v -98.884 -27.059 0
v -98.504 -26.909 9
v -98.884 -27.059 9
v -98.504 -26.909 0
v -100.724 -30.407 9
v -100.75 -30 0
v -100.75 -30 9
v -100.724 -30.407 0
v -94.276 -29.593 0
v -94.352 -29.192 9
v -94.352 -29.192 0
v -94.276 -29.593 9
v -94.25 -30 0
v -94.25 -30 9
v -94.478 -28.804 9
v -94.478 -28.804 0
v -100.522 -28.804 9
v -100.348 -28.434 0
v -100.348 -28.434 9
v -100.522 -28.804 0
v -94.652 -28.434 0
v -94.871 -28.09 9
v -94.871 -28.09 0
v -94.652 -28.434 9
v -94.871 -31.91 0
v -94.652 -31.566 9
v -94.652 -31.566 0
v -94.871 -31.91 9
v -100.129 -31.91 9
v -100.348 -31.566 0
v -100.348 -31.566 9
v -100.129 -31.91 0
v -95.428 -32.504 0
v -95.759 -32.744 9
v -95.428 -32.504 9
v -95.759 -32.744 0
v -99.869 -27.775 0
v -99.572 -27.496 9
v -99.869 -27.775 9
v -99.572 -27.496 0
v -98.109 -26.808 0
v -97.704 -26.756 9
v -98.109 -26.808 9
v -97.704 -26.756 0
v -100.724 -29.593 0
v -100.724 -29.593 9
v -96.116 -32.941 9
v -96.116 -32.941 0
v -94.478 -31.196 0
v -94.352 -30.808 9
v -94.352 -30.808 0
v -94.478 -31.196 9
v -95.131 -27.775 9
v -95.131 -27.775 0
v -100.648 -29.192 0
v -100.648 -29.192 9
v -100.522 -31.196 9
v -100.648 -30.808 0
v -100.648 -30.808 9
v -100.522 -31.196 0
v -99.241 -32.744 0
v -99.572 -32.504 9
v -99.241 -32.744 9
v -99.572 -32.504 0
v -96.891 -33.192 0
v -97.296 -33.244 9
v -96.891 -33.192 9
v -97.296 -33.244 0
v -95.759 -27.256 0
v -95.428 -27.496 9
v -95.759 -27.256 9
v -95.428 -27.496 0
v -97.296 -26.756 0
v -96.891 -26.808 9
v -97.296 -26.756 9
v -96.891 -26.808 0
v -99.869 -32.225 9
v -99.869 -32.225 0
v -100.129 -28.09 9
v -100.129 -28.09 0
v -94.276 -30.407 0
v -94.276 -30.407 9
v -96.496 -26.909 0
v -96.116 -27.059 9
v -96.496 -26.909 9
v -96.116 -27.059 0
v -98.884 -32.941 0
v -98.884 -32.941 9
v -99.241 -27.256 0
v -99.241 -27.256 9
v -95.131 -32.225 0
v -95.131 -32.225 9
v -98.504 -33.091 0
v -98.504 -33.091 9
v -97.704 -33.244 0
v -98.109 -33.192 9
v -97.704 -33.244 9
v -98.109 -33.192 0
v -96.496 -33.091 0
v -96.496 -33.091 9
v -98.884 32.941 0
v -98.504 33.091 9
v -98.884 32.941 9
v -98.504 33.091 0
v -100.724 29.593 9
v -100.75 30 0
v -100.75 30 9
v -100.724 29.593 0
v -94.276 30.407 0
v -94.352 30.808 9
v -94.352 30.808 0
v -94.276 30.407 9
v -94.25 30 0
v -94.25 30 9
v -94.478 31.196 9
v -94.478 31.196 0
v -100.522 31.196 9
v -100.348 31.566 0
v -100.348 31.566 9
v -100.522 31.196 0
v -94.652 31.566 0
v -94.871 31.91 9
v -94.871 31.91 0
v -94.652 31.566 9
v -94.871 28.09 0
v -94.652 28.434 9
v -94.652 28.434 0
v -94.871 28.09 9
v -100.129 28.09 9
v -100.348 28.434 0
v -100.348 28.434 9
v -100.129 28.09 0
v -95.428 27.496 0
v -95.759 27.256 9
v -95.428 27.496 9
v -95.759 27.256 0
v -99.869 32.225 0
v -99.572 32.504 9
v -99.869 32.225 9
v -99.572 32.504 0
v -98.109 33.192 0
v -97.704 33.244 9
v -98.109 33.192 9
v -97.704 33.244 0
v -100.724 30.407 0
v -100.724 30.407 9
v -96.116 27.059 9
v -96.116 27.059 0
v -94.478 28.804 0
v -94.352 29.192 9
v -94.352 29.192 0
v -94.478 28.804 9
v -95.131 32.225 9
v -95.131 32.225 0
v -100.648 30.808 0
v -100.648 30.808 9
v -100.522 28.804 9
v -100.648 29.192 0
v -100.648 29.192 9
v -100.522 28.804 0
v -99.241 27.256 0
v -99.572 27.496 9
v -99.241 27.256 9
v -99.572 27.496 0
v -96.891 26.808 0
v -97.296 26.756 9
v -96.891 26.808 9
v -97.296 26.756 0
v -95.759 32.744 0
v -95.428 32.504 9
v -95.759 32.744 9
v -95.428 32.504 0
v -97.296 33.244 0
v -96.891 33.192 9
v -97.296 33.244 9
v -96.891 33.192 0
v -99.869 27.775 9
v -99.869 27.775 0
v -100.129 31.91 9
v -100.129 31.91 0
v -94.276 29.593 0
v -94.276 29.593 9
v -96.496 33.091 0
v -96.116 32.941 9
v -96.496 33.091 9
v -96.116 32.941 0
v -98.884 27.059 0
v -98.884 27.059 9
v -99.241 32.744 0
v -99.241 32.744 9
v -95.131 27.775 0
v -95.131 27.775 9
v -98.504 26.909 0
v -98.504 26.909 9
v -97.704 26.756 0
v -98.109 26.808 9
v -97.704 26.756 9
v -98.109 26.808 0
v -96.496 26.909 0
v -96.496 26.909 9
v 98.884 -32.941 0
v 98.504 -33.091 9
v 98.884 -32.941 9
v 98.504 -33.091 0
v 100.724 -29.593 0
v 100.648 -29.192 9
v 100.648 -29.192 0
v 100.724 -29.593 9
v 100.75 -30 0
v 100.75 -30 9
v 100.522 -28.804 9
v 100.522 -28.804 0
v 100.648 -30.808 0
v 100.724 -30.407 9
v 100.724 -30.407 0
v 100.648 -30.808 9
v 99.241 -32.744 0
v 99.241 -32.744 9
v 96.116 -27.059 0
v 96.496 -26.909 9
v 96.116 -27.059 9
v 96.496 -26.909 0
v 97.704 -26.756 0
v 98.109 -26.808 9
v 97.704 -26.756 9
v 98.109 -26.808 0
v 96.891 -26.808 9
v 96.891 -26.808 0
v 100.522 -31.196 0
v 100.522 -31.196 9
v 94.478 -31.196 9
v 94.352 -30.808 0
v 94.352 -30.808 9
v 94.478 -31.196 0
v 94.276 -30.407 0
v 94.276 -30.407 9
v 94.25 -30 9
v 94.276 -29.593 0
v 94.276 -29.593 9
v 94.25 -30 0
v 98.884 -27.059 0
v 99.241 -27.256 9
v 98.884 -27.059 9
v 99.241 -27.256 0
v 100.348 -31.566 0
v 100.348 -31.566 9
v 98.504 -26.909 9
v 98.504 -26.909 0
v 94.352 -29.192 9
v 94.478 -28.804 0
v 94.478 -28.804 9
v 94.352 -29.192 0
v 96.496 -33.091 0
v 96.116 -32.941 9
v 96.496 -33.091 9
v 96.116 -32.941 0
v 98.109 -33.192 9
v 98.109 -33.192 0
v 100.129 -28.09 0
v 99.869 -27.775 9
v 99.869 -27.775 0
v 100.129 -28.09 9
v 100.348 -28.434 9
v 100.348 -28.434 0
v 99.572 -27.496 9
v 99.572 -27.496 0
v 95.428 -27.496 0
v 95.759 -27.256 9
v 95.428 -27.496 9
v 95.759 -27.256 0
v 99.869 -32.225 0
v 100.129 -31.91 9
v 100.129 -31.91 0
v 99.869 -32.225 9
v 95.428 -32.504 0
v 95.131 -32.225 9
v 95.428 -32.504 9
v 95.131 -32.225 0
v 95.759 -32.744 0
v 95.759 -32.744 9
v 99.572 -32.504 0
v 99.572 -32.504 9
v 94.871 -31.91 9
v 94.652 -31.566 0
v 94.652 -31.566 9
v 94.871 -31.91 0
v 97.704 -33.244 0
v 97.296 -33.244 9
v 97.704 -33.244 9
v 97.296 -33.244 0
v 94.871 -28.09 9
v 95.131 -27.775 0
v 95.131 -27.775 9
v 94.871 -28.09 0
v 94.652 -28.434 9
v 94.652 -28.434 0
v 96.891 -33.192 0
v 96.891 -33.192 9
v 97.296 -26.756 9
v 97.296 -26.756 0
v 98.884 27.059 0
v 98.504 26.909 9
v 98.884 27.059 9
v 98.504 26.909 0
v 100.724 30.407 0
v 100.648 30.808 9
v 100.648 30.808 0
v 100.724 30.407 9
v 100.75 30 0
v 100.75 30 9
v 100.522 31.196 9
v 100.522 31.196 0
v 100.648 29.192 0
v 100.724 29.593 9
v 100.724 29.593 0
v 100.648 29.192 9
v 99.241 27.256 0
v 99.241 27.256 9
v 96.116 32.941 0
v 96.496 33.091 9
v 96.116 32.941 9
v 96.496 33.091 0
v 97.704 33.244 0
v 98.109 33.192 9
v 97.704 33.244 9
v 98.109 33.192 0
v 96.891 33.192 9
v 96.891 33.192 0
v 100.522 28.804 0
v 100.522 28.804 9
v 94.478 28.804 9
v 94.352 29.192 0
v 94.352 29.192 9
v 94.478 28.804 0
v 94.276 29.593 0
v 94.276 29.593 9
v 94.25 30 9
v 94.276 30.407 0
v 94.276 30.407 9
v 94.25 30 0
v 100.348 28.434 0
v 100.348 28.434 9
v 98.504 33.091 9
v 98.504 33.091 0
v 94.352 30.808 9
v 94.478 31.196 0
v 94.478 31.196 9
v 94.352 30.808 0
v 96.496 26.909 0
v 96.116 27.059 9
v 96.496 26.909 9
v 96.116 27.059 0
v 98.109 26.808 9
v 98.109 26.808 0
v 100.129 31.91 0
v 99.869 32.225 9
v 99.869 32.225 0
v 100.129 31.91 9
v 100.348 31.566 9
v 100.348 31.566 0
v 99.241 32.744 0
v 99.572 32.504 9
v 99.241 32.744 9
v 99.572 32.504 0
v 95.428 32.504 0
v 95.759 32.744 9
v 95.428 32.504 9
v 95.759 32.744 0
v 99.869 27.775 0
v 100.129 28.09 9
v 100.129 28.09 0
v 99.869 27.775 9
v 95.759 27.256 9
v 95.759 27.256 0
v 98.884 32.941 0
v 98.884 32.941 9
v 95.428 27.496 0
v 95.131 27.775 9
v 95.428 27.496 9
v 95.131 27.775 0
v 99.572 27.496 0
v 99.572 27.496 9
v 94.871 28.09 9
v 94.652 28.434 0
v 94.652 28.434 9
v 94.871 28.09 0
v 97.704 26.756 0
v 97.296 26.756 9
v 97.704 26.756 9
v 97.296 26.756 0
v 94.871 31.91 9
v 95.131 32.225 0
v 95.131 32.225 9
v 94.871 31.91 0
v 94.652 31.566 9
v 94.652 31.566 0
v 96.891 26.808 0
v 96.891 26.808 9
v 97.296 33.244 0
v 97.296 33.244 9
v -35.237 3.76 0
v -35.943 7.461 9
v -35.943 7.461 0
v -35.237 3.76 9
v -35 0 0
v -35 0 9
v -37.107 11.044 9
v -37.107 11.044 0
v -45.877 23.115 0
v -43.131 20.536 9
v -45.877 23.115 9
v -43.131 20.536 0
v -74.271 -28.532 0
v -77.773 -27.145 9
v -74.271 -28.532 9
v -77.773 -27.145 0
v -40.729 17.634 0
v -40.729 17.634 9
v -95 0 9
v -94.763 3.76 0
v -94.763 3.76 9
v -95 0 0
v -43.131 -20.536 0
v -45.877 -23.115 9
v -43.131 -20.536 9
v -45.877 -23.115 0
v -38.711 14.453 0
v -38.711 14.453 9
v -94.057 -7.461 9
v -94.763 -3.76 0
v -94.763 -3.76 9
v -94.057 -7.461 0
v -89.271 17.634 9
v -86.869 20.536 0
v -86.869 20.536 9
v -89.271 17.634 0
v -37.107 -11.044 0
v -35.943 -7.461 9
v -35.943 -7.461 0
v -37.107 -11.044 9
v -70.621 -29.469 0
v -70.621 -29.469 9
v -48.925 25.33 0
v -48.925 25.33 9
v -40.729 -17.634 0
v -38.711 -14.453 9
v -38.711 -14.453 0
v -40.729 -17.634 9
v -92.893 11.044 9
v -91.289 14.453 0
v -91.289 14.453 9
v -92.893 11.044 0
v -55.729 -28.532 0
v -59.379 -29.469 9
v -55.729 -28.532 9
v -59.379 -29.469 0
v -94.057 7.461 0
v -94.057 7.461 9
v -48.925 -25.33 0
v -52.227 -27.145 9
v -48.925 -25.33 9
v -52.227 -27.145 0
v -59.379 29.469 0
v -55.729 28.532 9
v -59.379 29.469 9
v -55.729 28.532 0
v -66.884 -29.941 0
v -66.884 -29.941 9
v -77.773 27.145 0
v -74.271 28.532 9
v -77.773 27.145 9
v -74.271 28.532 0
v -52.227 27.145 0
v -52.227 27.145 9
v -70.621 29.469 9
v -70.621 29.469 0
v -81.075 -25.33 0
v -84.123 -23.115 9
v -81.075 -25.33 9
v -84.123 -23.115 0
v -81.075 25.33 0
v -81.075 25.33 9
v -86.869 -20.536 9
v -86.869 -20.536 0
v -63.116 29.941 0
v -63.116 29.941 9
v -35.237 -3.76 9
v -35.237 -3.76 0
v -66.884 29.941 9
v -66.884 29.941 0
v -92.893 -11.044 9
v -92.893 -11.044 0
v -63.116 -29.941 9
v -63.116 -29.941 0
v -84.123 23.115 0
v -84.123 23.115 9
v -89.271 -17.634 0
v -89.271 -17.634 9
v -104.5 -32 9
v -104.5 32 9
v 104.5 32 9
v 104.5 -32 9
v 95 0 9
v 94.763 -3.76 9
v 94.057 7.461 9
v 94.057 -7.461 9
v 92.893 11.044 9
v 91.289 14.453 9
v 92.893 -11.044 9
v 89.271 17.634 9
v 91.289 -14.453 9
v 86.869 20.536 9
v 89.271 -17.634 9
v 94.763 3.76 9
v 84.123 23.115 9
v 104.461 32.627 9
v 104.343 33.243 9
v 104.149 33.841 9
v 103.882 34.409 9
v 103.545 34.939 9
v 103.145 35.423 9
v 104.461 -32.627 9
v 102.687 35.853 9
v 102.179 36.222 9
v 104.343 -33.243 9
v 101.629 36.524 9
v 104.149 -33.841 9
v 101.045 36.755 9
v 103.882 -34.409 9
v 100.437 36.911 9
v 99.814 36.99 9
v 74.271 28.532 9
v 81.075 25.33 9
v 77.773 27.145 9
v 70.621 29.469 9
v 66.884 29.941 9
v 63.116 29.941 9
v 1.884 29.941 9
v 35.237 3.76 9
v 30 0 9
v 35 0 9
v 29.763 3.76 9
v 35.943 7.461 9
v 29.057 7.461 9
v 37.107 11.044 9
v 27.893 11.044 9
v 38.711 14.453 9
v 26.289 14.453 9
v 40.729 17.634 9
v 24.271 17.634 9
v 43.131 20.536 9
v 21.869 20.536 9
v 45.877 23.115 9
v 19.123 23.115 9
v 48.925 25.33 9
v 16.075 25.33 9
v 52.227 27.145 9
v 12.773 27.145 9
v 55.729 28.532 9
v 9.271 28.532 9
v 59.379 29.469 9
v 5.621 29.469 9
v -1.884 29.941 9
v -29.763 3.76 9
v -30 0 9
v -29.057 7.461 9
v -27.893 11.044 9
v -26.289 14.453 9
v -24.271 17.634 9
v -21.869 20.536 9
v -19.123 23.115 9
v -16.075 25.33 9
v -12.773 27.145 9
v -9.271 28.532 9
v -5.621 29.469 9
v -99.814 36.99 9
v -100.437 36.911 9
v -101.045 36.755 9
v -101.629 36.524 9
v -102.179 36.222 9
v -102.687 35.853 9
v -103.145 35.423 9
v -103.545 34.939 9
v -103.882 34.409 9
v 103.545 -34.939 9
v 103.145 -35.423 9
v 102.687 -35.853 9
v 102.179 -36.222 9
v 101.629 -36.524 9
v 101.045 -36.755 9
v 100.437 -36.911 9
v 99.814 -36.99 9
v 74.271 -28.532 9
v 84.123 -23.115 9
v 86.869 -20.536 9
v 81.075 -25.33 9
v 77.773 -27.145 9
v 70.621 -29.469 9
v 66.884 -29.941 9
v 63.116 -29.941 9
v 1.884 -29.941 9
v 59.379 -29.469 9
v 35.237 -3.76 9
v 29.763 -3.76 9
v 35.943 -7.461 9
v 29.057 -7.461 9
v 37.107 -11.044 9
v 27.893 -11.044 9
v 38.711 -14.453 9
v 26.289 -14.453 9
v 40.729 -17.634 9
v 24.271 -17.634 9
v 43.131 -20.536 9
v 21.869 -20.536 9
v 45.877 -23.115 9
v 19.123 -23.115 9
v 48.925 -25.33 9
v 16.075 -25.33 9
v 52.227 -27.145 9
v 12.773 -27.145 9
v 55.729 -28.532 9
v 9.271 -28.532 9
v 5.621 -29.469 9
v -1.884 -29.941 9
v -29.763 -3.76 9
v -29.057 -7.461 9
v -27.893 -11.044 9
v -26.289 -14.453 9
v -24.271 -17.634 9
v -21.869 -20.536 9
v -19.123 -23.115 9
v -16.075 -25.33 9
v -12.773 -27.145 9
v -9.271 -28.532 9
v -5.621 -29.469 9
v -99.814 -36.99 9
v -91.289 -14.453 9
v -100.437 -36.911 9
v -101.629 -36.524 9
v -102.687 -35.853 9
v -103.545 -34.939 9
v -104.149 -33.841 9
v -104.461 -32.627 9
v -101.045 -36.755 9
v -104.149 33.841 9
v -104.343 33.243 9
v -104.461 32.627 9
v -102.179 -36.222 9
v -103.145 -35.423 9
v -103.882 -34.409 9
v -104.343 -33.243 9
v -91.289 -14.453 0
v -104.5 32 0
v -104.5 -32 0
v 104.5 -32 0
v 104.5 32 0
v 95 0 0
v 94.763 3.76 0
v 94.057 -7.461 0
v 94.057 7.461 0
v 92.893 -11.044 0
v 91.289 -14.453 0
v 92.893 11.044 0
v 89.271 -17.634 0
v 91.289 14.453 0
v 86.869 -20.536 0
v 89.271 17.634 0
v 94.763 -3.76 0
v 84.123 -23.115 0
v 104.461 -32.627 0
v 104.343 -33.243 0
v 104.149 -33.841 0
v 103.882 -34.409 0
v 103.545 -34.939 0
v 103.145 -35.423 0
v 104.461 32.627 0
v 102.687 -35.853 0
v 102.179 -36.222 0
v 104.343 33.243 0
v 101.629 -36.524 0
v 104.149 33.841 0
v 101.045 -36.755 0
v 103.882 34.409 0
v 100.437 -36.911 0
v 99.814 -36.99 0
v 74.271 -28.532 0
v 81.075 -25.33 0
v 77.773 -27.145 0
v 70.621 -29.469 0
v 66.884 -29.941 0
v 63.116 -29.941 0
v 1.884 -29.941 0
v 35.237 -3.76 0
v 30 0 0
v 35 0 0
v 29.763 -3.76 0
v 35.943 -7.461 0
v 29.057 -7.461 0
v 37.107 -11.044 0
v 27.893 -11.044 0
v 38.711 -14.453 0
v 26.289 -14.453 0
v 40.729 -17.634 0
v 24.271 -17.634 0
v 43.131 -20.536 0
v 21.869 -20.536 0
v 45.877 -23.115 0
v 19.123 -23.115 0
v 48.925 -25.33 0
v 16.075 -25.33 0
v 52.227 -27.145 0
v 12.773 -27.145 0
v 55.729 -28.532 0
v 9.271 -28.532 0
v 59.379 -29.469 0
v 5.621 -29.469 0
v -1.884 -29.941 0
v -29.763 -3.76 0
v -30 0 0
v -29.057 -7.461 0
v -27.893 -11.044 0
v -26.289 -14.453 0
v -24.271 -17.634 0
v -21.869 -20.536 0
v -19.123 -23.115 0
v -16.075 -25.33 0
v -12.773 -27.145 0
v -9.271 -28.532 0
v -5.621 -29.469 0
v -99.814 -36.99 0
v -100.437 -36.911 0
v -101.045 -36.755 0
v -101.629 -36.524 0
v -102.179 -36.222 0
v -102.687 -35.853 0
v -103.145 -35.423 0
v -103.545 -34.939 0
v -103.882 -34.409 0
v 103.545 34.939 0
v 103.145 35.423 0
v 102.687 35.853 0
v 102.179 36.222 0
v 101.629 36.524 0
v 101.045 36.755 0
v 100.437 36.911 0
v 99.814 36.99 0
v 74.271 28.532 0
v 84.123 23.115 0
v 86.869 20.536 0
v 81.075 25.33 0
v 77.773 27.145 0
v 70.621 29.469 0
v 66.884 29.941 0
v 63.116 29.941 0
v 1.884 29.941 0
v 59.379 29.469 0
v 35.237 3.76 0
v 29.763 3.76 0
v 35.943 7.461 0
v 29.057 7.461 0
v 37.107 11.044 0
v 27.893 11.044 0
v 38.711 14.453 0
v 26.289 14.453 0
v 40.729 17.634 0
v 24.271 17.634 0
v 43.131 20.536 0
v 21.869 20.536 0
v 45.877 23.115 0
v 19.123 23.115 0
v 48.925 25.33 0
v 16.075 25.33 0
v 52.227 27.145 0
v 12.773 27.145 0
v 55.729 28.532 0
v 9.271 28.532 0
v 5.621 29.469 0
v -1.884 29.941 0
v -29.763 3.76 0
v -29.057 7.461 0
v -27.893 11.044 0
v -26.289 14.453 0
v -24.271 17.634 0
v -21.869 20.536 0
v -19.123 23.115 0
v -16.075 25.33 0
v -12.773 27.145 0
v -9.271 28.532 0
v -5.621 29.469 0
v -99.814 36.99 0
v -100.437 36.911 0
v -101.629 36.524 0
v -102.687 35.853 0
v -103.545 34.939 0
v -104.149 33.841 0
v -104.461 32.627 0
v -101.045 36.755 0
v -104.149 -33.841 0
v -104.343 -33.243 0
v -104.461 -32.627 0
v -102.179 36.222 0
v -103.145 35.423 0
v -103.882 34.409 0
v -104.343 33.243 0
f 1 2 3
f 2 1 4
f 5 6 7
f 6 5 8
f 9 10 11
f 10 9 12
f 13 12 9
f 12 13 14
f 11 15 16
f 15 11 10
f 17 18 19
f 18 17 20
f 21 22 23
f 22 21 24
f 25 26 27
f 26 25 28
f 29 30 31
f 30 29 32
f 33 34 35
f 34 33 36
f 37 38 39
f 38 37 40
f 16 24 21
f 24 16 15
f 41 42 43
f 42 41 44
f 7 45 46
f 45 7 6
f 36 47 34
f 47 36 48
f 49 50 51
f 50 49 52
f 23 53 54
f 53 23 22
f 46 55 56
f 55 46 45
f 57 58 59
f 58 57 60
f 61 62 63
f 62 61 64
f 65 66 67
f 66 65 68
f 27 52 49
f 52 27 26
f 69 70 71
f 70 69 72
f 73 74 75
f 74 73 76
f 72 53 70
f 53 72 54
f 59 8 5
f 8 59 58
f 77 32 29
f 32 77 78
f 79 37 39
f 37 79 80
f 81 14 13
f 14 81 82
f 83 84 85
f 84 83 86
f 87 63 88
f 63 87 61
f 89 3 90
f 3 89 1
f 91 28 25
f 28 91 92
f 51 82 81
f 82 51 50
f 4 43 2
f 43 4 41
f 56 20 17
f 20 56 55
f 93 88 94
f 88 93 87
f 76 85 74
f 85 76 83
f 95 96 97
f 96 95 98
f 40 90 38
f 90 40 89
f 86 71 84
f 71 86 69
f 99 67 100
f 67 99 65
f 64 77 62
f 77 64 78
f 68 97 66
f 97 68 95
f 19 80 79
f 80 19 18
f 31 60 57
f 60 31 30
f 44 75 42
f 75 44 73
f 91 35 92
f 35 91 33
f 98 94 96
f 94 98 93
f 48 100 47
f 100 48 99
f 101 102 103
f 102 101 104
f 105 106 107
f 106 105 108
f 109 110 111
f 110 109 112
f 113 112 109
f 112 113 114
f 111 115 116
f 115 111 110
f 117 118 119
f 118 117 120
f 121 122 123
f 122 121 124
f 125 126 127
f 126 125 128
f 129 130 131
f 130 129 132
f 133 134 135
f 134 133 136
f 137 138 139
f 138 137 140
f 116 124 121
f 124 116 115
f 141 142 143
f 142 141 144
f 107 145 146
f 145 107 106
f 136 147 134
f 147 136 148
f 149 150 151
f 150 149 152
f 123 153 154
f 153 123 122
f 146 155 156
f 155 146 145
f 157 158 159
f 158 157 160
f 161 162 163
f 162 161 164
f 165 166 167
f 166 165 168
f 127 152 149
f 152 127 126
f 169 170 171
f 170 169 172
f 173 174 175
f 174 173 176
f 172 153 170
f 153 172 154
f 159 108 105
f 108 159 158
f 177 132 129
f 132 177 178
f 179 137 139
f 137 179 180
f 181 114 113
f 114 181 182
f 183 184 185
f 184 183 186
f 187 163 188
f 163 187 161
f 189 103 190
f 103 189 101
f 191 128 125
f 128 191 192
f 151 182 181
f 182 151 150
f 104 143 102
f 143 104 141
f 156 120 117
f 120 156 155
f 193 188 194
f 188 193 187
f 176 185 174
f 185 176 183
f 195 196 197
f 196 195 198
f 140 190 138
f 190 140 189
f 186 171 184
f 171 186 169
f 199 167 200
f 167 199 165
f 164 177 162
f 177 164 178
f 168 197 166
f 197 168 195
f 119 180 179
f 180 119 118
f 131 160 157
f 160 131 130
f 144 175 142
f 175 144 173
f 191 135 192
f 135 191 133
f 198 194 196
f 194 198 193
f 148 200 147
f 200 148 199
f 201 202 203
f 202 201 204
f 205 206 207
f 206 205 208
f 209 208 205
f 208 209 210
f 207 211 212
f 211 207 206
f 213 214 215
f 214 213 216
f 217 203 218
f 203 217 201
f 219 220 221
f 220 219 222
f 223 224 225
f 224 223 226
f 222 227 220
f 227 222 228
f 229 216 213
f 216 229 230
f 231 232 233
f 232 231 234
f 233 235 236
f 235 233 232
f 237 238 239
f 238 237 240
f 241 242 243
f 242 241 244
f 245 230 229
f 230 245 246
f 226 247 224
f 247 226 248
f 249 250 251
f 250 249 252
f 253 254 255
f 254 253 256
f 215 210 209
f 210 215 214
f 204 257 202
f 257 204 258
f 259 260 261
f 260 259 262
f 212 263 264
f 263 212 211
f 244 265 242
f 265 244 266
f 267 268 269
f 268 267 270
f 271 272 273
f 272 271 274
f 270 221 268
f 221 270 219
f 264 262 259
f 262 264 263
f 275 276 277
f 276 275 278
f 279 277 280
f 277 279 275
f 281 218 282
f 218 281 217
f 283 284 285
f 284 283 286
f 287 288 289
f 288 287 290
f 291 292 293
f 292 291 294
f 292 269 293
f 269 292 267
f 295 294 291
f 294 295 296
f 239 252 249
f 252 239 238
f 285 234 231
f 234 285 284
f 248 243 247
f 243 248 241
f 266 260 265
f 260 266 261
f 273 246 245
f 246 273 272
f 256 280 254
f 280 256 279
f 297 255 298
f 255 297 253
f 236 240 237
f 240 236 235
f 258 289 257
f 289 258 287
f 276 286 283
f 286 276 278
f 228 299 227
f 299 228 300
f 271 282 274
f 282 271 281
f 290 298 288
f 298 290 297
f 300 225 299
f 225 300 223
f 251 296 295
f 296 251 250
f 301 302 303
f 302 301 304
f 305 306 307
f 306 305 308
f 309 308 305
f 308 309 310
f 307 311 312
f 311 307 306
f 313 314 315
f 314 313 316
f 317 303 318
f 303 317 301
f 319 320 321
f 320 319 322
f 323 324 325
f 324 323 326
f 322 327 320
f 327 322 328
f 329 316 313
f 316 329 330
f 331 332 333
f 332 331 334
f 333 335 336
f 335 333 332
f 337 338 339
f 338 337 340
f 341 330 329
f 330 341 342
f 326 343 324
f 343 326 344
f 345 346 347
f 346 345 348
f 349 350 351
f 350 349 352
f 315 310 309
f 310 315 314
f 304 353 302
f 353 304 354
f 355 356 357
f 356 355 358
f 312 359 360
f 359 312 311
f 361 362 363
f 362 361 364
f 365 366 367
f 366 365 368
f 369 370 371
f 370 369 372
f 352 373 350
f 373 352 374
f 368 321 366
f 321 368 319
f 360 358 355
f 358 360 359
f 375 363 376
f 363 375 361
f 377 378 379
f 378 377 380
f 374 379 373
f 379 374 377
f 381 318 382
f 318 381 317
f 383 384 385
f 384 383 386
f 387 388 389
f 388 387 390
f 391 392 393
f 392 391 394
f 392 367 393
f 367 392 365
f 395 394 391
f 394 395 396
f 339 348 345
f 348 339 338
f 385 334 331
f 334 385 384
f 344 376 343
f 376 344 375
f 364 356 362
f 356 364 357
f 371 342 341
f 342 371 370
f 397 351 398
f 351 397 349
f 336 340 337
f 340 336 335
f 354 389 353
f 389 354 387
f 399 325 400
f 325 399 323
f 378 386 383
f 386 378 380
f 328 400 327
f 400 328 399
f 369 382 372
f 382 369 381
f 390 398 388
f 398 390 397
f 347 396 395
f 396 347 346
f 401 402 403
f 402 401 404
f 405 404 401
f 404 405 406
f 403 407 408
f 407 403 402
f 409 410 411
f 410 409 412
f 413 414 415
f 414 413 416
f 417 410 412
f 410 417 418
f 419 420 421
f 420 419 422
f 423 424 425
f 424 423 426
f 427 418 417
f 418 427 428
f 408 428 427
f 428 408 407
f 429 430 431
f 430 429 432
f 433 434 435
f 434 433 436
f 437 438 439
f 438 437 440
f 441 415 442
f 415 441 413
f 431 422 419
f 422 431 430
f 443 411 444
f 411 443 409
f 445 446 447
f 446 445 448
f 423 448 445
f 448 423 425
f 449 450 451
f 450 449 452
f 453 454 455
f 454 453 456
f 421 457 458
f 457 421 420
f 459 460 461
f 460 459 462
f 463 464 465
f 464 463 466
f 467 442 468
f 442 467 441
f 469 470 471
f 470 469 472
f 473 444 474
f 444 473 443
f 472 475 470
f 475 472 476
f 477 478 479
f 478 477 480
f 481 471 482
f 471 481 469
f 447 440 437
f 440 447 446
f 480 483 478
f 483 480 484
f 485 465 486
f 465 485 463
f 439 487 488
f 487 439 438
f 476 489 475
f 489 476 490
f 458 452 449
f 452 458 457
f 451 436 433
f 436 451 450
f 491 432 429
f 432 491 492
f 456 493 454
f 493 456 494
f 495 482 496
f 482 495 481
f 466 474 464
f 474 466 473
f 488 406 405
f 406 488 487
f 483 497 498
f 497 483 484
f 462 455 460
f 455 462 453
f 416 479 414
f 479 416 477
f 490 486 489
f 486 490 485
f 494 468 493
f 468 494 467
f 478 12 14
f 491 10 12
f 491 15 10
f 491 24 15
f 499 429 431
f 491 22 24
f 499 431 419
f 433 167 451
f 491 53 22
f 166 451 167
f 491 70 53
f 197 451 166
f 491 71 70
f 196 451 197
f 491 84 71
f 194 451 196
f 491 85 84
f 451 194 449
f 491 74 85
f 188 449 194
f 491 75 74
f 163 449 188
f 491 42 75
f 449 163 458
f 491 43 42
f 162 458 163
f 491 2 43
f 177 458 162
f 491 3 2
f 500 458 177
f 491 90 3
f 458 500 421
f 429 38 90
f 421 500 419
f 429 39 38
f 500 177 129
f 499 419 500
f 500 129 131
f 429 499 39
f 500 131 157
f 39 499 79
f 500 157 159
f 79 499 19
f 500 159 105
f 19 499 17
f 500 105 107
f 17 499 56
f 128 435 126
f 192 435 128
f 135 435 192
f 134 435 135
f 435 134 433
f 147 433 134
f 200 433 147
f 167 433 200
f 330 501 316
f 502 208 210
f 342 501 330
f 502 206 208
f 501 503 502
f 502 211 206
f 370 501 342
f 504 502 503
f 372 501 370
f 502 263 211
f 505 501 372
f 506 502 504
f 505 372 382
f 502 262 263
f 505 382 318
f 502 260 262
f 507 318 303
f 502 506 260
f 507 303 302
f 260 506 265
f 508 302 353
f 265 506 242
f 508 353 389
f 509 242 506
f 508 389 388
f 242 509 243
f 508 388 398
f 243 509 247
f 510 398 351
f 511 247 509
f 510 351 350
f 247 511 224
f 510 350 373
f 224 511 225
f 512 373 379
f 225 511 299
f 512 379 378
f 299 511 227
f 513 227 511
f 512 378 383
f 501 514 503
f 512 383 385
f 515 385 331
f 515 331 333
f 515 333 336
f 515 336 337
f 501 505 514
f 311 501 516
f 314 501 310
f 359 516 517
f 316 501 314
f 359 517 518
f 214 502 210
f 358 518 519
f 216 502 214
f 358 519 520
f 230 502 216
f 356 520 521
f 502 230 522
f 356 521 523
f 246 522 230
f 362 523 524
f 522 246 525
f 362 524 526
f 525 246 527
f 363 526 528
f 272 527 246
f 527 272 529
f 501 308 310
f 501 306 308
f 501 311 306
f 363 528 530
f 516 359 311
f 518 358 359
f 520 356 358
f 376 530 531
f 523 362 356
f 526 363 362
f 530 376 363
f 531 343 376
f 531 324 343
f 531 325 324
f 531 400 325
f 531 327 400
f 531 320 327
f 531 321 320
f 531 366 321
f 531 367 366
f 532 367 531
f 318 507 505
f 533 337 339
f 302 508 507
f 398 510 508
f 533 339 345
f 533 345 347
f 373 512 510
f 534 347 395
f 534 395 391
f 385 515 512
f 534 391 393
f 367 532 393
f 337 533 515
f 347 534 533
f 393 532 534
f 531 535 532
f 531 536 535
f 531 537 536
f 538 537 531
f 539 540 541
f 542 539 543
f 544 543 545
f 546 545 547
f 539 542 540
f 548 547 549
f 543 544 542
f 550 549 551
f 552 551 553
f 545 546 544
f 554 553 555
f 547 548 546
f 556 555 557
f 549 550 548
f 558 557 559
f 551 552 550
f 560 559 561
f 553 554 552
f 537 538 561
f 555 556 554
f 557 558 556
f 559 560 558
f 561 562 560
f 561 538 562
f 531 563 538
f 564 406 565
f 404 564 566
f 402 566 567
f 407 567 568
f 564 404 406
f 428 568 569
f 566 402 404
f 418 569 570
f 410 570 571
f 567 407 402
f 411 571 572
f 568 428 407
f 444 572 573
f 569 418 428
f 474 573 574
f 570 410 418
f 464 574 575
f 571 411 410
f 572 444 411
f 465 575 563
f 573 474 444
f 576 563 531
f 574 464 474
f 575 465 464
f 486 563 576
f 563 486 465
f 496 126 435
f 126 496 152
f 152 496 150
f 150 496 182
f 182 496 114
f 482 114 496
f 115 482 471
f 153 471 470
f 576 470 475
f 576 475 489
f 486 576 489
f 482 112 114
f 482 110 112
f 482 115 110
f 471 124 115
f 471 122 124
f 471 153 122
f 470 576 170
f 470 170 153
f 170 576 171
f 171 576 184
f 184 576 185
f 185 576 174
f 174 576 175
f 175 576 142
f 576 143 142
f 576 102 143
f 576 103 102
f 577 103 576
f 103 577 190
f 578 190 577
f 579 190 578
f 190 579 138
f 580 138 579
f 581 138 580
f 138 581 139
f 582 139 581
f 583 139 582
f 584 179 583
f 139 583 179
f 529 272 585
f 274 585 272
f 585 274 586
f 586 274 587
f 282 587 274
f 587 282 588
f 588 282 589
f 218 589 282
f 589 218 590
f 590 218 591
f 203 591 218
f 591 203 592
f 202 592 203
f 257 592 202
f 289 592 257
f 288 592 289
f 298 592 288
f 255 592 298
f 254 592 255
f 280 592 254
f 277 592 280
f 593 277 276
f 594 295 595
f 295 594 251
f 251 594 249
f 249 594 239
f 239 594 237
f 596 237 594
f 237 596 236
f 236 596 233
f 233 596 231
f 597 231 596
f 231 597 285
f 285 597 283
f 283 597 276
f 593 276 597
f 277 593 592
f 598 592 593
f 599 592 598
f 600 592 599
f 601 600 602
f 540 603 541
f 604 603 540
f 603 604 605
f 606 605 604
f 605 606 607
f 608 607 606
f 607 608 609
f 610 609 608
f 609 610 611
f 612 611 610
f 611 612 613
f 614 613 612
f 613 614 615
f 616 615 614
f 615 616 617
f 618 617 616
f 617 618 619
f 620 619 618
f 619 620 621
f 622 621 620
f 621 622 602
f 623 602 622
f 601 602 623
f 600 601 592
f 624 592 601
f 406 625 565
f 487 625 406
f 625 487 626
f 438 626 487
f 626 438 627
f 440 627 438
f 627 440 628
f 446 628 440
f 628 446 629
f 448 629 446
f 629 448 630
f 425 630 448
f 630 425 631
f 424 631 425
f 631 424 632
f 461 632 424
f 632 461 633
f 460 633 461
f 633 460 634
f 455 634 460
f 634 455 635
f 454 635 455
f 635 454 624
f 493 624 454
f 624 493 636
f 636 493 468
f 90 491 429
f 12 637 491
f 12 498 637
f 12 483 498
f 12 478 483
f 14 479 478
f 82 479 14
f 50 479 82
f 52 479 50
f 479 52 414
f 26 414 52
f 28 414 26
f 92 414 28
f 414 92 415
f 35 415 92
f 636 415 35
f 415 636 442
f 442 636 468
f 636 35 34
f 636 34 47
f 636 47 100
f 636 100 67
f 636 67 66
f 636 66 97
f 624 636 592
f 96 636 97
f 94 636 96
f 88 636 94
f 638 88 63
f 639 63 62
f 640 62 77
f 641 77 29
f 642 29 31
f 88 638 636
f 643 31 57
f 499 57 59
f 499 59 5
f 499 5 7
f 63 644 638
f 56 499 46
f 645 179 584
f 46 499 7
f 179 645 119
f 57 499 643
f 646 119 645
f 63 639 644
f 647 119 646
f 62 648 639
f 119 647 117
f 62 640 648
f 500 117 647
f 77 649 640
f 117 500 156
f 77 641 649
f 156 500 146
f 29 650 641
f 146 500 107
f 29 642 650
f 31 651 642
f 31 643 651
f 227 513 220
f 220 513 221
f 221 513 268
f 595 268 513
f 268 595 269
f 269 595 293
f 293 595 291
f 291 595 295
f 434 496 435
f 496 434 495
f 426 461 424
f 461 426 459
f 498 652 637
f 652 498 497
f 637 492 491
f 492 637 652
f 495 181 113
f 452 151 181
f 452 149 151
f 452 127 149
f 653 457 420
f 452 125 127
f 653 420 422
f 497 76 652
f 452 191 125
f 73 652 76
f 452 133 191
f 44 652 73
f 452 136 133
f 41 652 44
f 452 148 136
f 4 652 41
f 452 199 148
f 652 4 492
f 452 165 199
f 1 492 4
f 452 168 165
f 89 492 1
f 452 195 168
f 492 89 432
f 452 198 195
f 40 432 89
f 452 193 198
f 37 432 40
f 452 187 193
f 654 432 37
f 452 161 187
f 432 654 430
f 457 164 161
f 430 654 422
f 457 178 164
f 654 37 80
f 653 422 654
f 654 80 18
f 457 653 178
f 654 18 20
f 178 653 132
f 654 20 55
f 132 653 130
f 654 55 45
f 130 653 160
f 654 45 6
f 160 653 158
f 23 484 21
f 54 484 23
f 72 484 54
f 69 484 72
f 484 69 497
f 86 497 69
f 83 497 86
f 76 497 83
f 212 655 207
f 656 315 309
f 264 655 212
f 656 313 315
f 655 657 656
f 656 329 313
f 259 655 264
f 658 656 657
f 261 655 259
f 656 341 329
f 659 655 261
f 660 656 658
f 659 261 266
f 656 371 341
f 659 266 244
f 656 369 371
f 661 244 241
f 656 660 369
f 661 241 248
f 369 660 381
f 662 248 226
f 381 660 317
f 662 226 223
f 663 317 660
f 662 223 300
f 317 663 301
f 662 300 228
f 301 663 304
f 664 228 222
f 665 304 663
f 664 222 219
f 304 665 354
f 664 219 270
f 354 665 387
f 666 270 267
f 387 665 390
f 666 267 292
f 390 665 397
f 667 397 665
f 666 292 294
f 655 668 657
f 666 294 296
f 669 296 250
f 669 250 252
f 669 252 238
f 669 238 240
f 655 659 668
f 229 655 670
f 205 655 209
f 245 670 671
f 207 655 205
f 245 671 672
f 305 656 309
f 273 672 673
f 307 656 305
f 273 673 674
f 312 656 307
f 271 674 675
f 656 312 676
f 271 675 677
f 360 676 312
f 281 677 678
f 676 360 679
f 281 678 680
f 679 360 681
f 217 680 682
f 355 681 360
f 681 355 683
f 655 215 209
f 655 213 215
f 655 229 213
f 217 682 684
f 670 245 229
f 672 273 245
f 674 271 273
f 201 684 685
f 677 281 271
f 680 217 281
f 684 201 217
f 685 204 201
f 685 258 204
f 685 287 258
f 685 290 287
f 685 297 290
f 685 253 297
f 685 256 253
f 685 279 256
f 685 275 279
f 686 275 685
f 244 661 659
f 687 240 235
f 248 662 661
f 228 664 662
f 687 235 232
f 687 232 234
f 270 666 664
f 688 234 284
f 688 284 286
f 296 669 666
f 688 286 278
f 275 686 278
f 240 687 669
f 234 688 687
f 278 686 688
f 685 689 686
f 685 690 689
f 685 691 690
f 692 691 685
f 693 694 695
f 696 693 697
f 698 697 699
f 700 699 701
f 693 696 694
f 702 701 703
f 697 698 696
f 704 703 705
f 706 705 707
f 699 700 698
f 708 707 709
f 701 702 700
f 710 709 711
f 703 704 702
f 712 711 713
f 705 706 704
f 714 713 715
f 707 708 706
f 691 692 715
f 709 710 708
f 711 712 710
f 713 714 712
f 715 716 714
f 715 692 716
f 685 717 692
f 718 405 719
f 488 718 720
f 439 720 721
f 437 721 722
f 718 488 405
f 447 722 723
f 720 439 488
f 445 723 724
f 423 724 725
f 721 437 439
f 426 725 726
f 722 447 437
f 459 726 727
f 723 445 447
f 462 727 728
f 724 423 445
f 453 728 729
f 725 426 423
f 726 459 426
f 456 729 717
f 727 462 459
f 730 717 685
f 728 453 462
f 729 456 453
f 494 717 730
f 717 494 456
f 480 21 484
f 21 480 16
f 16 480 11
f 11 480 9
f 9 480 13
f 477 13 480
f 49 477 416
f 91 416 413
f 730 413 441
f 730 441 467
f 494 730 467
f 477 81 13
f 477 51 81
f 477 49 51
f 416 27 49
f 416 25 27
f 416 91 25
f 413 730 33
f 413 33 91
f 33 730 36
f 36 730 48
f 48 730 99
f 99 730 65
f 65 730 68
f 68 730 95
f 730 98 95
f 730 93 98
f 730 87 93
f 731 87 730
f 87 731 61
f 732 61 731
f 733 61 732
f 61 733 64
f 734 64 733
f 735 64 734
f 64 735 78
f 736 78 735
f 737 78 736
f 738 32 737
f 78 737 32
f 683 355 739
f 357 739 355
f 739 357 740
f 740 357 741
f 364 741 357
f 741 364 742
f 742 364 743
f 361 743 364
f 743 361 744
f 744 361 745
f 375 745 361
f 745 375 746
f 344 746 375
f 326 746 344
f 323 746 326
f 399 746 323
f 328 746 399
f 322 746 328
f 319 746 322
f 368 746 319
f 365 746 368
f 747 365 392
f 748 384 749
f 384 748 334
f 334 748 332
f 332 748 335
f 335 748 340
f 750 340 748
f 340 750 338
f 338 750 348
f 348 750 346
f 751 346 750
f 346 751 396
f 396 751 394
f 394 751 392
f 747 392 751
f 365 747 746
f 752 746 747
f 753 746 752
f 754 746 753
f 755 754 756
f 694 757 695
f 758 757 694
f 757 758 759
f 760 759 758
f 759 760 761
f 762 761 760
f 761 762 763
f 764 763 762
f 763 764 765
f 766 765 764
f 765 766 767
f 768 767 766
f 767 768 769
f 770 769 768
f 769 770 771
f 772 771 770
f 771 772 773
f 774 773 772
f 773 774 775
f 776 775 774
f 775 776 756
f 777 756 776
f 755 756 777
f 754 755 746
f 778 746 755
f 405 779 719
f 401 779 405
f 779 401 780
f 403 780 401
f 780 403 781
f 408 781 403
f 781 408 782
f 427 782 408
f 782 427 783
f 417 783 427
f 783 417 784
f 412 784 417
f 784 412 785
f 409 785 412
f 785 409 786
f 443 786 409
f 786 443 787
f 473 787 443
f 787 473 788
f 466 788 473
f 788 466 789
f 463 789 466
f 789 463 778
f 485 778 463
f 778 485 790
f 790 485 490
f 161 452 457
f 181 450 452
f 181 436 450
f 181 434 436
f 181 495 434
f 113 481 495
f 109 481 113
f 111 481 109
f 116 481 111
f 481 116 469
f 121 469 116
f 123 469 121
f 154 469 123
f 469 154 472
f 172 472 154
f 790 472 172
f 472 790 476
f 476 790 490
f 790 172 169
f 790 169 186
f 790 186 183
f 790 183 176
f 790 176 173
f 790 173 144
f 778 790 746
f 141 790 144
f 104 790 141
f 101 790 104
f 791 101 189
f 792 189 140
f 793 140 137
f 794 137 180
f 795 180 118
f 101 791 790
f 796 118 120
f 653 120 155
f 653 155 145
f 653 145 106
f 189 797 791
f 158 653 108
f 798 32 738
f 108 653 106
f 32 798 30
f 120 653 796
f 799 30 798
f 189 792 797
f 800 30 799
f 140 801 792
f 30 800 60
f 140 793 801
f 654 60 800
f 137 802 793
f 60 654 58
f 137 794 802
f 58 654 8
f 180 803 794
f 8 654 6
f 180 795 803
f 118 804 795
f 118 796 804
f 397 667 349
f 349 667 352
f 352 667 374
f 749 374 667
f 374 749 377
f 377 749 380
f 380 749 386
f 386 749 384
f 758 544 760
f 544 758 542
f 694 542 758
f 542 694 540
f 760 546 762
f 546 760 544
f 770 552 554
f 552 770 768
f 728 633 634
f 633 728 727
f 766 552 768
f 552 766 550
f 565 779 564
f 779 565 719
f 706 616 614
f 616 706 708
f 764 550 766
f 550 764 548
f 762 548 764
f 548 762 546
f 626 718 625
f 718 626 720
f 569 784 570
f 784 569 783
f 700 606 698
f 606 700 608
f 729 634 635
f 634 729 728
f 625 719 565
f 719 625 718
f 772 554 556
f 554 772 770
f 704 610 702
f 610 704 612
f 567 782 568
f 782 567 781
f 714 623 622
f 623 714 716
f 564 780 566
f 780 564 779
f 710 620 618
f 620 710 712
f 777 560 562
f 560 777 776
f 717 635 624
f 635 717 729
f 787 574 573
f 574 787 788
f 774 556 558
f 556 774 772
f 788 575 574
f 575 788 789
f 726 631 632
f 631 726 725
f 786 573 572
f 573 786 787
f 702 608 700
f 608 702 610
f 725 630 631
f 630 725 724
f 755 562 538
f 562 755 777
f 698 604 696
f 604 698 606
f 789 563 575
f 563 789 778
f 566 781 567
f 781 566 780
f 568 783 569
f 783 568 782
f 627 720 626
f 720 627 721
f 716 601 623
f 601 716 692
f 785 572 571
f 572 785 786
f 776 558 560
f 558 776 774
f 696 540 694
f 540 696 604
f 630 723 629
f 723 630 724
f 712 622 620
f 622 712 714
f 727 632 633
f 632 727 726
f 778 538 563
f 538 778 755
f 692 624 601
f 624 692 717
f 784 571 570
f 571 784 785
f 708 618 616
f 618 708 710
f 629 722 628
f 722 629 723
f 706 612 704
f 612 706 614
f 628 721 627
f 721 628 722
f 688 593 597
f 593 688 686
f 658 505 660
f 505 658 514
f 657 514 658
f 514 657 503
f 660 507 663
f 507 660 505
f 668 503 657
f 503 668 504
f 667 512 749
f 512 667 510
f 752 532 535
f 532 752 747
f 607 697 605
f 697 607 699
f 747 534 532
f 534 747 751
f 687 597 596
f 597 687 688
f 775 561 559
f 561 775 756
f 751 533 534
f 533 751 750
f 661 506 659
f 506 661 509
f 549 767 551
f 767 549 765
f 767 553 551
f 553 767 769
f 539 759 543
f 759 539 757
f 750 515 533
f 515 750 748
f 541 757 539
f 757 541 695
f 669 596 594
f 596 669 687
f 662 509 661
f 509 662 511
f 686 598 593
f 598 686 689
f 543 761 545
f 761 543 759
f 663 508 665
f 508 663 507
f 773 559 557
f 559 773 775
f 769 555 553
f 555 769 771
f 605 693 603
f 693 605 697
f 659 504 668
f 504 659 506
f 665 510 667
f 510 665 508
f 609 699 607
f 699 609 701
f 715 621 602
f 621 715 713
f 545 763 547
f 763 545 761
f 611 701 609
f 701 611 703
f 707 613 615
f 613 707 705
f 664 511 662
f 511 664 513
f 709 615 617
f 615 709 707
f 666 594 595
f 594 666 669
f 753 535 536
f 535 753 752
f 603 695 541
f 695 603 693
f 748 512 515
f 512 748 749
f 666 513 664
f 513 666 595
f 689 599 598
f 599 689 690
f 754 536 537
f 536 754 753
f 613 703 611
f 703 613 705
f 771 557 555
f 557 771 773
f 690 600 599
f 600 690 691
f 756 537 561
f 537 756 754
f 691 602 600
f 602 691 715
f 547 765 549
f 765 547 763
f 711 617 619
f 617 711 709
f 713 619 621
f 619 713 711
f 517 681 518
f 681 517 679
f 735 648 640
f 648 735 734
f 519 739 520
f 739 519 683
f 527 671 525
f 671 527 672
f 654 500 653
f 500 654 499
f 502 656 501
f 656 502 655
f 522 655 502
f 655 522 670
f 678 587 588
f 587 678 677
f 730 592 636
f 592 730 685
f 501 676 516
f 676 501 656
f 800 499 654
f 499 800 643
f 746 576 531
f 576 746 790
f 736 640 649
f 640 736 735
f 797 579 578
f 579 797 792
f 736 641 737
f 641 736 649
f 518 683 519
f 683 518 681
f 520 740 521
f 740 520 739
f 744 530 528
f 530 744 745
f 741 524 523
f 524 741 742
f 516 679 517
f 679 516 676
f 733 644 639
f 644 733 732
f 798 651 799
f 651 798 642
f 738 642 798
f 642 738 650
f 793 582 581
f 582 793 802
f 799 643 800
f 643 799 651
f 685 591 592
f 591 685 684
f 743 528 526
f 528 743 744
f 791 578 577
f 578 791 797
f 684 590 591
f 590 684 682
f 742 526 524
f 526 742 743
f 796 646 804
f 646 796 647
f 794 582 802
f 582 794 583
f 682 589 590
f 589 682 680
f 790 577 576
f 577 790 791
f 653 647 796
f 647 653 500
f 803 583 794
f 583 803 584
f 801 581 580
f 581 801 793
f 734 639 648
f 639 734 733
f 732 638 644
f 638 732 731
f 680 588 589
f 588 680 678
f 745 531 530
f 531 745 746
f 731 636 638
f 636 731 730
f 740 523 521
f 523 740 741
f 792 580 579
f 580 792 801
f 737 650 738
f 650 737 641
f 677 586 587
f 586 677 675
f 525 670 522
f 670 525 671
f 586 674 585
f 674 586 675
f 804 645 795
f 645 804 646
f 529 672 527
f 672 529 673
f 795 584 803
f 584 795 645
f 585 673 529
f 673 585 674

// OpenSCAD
$fn = 50;


difference() {
	union() {
		hull() {
			translate(v = [-99.5000000000, 32.0000000000, 0]) {
				cylinder(h = 9, r = 5);
			}
			translate(v = [99.5000000000, 32.0000000000, 0]) {
				cylinder(h = 9, r = 5);
			}
			translate(v = [-99.5000000000, -32.0000000000, 0]) {
				cylinder(h = 9, r = 5);
			}
			translate(v = [99.5000000000, -32.0000000000, 0]) {
				cylinder(h = 9, r = 5);
			}
		}
	}
	union() {
		#translate(v = [-97.5000000000, -30.0000000000, -100.0000000000]) {
			cylinder(h = 200, r = 3.2500000000);
		}
		#translate(v = [-97.5000000000, 30.0000000000, -100.0000000000]) {
			cylinder(h = 200, r = 3.2500000000);
		}
		#translate(v = [97.5000000000, -30.0000000000, -100.0000000000]) {
			cylinder(h = 200, r = 3.2500000000);
		}
		#translate(v = [97.5000000000, 30.0000000000, -100.0000000000]) {
			cylinder(h = 200, r = 3.2500000000);
		}
		#translate(v = [-65.0000000000, 0, 0]) {
			cylinder(h = 9, r = 30.0000000000);
		}
		#cylinder(h = 9, r = 30.0000000000);
		#translate(v = [65.0000000000, 0, 0]) {
			cylinder(h = 9, r = 30.0000000000);
		}
	}
}
